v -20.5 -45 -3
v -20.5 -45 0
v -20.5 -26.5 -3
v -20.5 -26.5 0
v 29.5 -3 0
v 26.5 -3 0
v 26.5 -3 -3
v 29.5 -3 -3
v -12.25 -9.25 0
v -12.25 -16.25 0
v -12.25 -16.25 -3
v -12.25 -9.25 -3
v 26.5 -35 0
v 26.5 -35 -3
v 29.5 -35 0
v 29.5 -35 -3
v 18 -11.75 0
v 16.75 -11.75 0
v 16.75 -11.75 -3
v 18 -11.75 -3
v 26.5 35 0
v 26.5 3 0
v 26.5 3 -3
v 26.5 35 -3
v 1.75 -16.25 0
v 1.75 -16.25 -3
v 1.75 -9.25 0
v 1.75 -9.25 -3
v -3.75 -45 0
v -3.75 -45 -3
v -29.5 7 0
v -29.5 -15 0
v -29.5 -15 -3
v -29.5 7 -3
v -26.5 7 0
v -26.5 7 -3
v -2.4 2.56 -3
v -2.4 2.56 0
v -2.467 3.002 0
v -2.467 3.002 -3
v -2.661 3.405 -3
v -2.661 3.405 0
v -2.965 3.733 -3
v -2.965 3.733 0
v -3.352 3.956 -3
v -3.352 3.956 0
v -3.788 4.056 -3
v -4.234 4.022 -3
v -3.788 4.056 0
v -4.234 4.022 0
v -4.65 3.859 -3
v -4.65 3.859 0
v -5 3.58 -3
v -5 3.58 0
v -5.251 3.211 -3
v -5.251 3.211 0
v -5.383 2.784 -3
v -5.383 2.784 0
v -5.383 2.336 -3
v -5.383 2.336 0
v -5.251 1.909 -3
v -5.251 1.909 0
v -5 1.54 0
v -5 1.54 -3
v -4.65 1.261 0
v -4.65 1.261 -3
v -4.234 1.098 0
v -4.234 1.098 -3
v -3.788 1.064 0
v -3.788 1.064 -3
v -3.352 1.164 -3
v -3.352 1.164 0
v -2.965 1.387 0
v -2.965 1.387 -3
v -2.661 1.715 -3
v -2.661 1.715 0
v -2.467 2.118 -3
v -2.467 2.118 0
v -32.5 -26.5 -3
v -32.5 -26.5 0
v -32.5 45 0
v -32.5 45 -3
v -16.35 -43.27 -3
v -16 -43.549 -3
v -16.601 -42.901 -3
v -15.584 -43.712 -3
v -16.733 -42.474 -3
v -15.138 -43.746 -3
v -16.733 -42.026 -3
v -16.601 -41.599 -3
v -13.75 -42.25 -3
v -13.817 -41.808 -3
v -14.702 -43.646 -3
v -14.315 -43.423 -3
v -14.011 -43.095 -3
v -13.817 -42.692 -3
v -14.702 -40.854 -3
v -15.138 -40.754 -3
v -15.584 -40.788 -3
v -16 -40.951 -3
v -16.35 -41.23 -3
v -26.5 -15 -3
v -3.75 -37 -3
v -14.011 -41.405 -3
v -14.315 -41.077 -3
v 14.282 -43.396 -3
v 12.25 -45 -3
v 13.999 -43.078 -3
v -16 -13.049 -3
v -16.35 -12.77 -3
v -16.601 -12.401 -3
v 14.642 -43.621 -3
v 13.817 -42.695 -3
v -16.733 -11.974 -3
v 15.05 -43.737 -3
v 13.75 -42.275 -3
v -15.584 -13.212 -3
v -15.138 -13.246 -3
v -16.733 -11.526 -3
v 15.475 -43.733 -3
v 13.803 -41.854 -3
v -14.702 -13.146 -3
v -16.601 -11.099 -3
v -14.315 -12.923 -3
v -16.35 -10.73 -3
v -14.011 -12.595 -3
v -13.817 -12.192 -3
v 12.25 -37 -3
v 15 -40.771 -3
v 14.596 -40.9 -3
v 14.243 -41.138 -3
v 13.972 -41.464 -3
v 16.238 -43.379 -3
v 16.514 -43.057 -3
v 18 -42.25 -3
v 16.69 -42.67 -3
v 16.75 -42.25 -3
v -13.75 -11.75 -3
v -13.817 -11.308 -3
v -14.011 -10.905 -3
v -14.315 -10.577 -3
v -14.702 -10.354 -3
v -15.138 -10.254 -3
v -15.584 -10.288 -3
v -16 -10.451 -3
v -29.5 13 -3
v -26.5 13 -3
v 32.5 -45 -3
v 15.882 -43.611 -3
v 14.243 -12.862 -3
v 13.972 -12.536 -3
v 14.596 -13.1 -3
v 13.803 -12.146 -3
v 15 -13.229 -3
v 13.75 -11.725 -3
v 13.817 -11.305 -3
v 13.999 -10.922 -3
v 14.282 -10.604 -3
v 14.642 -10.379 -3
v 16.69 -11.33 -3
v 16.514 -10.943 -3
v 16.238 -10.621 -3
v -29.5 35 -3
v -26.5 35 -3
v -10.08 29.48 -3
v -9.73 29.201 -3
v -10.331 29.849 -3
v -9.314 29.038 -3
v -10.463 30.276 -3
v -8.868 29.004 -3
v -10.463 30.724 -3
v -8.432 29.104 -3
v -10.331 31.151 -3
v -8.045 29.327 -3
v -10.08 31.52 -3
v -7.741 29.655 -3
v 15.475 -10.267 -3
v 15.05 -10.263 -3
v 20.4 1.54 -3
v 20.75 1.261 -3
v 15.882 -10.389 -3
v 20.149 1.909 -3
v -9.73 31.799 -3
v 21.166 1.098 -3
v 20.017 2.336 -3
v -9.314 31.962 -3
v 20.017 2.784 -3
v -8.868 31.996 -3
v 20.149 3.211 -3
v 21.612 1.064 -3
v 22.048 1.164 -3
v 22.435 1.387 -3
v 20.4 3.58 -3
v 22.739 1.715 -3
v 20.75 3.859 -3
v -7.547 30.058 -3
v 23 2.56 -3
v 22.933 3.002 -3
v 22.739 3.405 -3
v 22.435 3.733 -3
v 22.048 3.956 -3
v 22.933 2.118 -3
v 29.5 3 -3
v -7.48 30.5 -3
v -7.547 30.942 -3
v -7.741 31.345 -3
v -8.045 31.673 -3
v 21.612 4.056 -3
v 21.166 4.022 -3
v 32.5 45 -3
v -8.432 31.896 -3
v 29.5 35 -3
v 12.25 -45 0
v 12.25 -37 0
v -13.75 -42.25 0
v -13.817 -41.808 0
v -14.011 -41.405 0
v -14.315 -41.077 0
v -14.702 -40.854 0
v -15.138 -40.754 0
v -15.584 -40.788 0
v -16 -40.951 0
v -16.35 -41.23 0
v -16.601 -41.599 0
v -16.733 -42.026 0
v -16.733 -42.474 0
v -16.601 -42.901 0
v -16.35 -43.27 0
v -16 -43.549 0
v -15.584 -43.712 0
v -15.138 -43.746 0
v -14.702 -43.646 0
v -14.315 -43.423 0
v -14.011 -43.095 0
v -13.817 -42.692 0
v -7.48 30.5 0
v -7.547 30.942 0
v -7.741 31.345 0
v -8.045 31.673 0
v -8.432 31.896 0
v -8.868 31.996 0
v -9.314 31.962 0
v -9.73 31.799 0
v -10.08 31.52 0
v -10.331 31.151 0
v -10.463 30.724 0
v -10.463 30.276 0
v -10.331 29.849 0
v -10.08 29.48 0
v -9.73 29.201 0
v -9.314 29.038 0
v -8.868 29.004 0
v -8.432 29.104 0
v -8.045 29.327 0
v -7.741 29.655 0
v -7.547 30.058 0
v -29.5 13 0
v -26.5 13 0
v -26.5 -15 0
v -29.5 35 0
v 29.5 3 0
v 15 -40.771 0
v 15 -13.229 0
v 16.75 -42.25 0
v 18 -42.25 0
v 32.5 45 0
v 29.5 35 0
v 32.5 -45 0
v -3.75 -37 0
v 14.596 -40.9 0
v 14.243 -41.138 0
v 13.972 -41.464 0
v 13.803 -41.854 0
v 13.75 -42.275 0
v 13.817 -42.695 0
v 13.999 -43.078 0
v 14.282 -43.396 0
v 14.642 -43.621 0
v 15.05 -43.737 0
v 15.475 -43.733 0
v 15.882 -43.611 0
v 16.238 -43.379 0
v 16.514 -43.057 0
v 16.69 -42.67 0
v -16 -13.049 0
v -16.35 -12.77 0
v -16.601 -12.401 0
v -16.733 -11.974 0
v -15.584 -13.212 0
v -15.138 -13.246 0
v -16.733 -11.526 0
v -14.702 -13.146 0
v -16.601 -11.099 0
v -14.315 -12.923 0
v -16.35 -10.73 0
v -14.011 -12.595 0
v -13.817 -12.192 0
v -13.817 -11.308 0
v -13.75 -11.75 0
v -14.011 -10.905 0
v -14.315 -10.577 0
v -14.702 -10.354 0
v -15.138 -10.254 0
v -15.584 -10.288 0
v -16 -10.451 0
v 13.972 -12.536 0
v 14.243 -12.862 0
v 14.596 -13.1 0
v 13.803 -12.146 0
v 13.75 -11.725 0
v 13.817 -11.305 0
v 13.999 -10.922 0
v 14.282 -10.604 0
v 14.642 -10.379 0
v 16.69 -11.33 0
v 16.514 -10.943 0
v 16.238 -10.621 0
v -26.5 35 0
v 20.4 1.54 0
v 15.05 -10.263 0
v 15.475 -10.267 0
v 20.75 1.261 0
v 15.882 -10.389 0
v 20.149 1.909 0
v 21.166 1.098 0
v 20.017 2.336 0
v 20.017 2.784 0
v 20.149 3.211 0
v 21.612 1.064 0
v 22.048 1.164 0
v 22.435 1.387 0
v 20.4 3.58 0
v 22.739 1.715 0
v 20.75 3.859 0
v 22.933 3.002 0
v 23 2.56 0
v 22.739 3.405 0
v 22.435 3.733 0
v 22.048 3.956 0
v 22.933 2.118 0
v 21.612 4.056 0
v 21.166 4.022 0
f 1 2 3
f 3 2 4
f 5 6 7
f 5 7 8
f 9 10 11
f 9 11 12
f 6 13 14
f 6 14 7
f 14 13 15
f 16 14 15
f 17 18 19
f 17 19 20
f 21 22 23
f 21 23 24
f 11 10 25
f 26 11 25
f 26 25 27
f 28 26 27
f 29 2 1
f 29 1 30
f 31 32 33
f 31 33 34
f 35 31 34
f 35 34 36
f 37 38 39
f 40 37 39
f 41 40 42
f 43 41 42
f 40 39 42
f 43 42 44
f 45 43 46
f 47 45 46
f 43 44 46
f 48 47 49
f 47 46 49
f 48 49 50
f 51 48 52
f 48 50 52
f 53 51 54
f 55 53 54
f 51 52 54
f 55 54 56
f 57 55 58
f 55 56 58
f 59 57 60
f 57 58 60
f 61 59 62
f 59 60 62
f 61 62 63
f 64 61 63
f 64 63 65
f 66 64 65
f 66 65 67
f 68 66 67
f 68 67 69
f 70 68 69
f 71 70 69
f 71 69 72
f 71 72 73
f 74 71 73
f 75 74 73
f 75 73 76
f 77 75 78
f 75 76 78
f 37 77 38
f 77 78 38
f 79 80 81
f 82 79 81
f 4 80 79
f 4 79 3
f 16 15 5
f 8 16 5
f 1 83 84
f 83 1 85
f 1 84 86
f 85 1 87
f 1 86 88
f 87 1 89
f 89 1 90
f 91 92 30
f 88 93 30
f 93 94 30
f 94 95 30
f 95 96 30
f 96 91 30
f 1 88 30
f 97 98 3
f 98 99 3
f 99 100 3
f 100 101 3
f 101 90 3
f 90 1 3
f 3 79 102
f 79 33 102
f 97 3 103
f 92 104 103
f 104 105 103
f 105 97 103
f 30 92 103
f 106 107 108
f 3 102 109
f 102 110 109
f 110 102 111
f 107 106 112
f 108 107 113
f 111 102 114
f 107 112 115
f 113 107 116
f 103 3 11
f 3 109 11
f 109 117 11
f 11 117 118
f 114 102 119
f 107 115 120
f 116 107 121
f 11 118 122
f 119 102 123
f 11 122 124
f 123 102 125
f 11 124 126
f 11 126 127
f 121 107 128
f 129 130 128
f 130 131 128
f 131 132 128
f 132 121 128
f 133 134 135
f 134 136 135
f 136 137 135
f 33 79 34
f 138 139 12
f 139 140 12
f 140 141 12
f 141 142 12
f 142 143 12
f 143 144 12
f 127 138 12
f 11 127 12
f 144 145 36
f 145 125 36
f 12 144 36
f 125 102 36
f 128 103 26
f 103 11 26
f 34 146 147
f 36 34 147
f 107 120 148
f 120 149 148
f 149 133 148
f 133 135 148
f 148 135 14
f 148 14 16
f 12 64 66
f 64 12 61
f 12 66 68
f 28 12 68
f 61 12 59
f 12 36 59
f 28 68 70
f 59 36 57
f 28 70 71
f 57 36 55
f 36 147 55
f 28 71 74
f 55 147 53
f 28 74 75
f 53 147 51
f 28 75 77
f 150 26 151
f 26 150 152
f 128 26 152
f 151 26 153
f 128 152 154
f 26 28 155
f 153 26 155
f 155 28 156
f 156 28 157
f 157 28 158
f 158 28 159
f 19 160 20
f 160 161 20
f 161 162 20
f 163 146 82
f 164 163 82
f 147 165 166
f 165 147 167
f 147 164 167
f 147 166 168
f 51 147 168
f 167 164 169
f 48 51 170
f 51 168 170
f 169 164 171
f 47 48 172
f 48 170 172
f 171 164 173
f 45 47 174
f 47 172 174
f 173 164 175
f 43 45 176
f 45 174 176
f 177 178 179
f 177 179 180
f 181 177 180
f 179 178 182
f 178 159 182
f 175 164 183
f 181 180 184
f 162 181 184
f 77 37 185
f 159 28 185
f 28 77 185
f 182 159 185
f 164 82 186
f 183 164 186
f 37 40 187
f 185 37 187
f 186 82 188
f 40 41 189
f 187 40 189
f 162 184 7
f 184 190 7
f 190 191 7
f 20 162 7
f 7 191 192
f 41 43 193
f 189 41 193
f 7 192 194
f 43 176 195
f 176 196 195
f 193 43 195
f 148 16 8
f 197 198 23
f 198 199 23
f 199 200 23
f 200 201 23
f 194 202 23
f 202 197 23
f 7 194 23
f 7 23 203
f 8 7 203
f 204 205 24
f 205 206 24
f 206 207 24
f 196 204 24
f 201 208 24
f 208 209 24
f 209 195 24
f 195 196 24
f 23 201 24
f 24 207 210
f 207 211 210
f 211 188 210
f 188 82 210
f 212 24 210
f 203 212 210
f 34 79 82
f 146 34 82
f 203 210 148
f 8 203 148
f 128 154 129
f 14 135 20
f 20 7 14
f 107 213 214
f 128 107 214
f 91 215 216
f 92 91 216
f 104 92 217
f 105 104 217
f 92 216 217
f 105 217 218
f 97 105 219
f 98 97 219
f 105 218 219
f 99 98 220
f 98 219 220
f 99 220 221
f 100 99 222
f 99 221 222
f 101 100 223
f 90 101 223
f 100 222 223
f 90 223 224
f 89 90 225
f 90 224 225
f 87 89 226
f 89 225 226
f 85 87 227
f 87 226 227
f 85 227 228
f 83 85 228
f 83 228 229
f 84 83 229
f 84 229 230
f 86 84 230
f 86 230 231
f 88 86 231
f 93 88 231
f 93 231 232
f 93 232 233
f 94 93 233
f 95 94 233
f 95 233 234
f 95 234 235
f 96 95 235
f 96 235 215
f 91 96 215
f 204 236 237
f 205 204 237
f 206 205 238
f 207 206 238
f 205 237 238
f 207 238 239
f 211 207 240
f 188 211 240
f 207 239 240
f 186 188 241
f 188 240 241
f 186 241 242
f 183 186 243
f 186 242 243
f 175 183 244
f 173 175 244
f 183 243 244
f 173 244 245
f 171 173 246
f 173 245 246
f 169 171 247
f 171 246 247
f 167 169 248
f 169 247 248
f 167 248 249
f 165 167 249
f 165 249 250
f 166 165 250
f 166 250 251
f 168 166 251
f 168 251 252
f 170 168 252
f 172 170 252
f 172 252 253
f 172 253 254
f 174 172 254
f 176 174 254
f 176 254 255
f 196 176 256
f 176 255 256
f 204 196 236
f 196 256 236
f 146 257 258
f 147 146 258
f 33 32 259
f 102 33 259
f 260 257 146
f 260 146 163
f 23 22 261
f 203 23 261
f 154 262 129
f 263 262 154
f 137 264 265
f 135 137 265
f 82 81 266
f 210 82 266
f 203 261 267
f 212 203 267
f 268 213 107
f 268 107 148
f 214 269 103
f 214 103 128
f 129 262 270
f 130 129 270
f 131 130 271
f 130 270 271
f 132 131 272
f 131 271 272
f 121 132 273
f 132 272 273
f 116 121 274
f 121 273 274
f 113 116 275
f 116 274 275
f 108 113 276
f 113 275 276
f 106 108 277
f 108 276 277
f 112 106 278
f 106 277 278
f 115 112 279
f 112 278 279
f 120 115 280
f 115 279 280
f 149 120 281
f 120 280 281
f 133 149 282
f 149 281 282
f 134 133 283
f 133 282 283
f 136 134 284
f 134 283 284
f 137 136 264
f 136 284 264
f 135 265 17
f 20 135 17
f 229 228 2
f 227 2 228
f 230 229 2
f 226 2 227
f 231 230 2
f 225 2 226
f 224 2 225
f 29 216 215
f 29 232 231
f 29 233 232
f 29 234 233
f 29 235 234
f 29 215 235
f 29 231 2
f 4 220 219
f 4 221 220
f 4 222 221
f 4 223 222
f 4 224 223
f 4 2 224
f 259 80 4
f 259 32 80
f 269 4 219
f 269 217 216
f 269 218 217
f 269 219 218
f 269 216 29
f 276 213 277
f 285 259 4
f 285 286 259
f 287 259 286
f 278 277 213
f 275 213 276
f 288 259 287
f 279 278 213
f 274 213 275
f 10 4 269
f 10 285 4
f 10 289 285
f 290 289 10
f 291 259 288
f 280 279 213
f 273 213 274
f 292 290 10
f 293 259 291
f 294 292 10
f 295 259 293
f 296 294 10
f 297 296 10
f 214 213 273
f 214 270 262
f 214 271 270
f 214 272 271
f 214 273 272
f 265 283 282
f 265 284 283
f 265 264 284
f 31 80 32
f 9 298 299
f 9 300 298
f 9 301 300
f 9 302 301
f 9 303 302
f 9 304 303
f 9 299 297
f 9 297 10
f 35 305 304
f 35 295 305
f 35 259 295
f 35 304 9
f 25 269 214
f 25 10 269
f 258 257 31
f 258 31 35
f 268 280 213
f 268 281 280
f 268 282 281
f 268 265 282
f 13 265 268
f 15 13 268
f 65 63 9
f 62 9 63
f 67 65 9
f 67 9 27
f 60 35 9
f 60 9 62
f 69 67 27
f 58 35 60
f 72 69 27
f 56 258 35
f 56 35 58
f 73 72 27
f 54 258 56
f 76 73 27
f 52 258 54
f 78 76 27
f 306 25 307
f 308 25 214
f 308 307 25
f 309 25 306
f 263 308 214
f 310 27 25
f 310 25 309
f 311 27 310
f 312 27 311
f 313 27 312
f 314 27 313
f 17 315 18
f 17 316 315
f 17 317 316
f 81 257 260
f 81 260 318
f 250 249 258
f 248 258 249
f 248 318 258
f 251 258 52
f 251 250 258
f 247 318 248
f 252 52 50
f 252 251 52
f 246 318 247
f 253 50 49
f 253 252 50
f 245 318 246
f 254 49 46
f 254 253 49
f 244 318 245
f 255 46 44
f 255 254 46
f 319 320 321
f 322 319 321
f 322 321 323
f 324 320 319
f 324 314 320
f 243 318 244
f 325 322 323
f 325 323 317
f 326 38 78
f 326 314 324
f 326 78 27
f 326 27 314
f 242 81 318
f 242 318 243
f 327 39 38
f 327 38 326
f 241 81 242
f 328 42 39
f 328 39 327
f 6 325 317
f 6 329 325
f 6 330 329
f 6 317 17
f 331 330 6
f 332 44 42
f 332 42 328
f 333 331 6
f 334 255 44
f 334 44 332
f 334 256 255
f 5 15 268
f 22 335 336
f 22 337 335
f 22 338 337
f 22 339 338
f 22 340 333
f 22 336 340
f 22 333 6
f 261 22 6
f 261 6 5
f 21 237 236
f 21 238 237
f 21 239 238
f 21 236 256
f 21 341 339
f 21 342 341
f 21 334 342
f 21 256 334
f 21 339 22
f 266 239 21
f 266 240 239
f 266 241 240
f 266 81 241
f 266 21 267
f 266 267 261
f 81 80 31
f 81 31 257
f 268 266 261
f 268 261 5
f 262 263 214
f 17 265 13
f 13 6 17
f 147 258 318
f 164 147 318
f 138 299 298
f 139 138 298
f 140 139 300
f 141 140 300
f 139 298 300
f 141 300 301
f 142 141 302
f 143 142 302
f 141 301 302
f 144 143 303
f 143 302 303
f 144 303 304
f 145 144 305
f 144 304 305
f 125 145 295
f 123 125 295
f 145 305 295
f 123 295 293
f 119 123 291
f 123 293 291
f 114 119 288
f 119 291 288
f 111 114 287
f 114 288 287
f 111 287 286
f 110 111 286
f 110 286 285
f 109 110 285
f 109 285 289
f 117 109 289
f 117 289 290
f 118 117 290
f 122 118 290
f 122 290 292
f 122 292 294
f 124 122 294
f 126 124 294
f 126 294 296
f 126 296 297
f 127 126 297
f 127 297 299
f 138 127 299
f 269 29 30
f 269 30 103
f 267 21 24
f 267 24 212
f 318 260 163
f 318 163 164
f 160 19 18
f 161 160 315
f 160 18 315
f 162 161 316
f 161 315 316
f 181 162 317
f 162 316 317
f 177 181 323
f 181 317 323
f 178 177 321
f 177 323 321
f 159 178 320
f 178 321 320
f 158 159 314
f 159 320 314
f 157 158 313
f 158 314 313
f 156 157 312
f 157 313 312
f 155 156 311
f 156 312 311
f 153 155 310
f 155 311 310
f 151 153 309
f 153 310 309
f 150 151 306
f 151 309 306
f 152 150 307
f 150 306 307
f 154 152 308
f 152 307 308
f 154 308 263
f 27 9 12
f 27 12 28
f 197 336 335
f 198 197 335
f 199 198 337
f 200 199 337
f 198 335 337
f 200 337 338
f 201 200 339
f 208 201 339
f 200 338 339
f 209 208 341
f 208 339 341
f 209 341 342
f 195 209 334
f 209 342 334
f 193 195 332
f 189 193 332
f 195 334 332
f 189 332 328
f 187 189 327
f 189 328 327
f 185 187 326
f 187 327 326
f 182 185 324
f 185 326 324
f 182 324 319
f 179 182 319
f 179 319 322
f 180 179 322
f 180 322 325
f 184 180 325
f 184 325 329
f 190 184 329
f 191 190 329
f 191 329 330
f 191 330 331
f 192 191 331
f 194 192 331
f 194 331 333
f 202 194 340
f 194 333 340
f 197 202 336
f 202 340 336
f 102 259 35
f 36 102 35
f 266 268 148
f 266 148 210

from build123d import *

# Parameters (mm, degrees)
SKETCH1_W           = 65
SKETCH1_H           = 90
BOSS_EXTRUDE1_DEPTH = 3
SKETCH3_R           = 1.5
CUT_EXTRUDE2_DEPTH  = 3
SKETCH4_R           = 1.5
CUT_EXTRUDE3_DEPTH  = 4
SKETCH5_W           = 3
SKETCH5_H           = 32
CUT_EXTRUDE4_DEPTH  = 4
SKETCH6_W           = 3
SKETCH6_H           = 22
CUT_EXTRUDE5_DEPTH  = 4
SKETCH7_W           = 3
SKETCH7_H           = 30.5
SKETCH7_W_2         = 14
SKETCH7_H_2         = 7
SKETCH7_W_3         = 16
SKETCH7_H_3         = 8
CUT_EXTRUDE6_DEPTH  = 4
SKETCH8_W           = 12
SKETCH8_H           = 18.5
CUT_EXTRUDE7_DEPTH  = 4


with BuildPart() as part:
    # Sketch1 → Boss-Extrude1 (new body)
    with BuildSketch(Plane.XY):
        Rectangle(SKETCH1_W, SKETCH1_H)
    extrude(amount=-BOSS_EXTRUDE1_DEPTH)

    # Sketch3 → Cut-Extrude2 (cut)
    with BuildSketch(Plane.XY):
        with Locations((-8.98, 30.5)):
            Circle(SKETCH3_R)
        with Locations((-3.9, 2.56)):
            Circle(SKETCH3_R)
        with Locations((21.5, 2.56)):
            Circle(SKETCH3_R)
    extrude(amount=-CUT_EXTRUDE2_DEPTH, mode=Mode.SUBTRACT)

    # Sketch4 → Cut-Extrude3 (cut, through all)
    with BuildSketch(Plane.XY):
        with Locations((-15.25, -42.25)):
            Circle(SKETCH4_R)
        with Locations((-15.25, -11.75)):
            Circle(SKETCH4_R)
        with Locations((15.25, -42.25)):
            Circle(SKETCH4_R)
        with Locations((15.25, -11.75)):
            Circle(SKETCH4_R)
    extrude(amount=-CUT_EXTRUDE3_DEPTH, mode=Mode.SUBTRACT)

    # Sketch5 → Cut-Extrude4 (cut, through all)
    with BuildSketch(Plane.XY):
        with Locations((28, -19)):
            Rectangle(SKETCH5_W, SKETCH5_H)
        with Locations((28, 19)):
            Rectangle(SKETCH5_W, SKETCH5_H)
    extrude(amount=-CUT_EXTRUDE4_DEPTH, mode=Mode.SUBTRACT)

    # Sketch6 → Cut-Extrude5 (cut, through all)
    with BuildSketch(Plane.XY):
        with Locations((-28, -4)):
            Rectangle(SKETCH6_W, SKETCH6_H)
        with Locations((-28, 24)):
            Rectangle(SKETCH6_W, SKETCH6_H)
    extrude(amount=-CUT_EXTRUDE5_DEPTH, mode=Mode.SUBTRACT)

    # Sketch7 → Cut-Extrude6 (cut, through all)
    with BuildSketch(Plane.XY):
        with Locations((16.5, -27)):
            Rectangle(SKETCH7_W, SKETCH7_H)
        with Locations((-5.25, -12.75)):
            Rectangle(SKETCH7_W_2, SKETCH7_H_2)
        with Locations((4.25, -41)):
            Rectangle(SKETCH7_W_3, SKETCH7_H_3)
    extrude(amount=-CUT_EXTRUDE6_DEPTH, mode=Mode.SUBTRACT)

    # Sketch8 → Cut-Extrude7 (cut, through all)
    with BuildSketch(Plane.XY):
        with Locations((-26.5, -35.75)):
            Rectangle(SKETCH8_W, SKETCH8_H)
    extrude(amount=-CUT_EXTRUDE7_DEPTH, mode=Mode.SUBTRACT)


solid = part.part
